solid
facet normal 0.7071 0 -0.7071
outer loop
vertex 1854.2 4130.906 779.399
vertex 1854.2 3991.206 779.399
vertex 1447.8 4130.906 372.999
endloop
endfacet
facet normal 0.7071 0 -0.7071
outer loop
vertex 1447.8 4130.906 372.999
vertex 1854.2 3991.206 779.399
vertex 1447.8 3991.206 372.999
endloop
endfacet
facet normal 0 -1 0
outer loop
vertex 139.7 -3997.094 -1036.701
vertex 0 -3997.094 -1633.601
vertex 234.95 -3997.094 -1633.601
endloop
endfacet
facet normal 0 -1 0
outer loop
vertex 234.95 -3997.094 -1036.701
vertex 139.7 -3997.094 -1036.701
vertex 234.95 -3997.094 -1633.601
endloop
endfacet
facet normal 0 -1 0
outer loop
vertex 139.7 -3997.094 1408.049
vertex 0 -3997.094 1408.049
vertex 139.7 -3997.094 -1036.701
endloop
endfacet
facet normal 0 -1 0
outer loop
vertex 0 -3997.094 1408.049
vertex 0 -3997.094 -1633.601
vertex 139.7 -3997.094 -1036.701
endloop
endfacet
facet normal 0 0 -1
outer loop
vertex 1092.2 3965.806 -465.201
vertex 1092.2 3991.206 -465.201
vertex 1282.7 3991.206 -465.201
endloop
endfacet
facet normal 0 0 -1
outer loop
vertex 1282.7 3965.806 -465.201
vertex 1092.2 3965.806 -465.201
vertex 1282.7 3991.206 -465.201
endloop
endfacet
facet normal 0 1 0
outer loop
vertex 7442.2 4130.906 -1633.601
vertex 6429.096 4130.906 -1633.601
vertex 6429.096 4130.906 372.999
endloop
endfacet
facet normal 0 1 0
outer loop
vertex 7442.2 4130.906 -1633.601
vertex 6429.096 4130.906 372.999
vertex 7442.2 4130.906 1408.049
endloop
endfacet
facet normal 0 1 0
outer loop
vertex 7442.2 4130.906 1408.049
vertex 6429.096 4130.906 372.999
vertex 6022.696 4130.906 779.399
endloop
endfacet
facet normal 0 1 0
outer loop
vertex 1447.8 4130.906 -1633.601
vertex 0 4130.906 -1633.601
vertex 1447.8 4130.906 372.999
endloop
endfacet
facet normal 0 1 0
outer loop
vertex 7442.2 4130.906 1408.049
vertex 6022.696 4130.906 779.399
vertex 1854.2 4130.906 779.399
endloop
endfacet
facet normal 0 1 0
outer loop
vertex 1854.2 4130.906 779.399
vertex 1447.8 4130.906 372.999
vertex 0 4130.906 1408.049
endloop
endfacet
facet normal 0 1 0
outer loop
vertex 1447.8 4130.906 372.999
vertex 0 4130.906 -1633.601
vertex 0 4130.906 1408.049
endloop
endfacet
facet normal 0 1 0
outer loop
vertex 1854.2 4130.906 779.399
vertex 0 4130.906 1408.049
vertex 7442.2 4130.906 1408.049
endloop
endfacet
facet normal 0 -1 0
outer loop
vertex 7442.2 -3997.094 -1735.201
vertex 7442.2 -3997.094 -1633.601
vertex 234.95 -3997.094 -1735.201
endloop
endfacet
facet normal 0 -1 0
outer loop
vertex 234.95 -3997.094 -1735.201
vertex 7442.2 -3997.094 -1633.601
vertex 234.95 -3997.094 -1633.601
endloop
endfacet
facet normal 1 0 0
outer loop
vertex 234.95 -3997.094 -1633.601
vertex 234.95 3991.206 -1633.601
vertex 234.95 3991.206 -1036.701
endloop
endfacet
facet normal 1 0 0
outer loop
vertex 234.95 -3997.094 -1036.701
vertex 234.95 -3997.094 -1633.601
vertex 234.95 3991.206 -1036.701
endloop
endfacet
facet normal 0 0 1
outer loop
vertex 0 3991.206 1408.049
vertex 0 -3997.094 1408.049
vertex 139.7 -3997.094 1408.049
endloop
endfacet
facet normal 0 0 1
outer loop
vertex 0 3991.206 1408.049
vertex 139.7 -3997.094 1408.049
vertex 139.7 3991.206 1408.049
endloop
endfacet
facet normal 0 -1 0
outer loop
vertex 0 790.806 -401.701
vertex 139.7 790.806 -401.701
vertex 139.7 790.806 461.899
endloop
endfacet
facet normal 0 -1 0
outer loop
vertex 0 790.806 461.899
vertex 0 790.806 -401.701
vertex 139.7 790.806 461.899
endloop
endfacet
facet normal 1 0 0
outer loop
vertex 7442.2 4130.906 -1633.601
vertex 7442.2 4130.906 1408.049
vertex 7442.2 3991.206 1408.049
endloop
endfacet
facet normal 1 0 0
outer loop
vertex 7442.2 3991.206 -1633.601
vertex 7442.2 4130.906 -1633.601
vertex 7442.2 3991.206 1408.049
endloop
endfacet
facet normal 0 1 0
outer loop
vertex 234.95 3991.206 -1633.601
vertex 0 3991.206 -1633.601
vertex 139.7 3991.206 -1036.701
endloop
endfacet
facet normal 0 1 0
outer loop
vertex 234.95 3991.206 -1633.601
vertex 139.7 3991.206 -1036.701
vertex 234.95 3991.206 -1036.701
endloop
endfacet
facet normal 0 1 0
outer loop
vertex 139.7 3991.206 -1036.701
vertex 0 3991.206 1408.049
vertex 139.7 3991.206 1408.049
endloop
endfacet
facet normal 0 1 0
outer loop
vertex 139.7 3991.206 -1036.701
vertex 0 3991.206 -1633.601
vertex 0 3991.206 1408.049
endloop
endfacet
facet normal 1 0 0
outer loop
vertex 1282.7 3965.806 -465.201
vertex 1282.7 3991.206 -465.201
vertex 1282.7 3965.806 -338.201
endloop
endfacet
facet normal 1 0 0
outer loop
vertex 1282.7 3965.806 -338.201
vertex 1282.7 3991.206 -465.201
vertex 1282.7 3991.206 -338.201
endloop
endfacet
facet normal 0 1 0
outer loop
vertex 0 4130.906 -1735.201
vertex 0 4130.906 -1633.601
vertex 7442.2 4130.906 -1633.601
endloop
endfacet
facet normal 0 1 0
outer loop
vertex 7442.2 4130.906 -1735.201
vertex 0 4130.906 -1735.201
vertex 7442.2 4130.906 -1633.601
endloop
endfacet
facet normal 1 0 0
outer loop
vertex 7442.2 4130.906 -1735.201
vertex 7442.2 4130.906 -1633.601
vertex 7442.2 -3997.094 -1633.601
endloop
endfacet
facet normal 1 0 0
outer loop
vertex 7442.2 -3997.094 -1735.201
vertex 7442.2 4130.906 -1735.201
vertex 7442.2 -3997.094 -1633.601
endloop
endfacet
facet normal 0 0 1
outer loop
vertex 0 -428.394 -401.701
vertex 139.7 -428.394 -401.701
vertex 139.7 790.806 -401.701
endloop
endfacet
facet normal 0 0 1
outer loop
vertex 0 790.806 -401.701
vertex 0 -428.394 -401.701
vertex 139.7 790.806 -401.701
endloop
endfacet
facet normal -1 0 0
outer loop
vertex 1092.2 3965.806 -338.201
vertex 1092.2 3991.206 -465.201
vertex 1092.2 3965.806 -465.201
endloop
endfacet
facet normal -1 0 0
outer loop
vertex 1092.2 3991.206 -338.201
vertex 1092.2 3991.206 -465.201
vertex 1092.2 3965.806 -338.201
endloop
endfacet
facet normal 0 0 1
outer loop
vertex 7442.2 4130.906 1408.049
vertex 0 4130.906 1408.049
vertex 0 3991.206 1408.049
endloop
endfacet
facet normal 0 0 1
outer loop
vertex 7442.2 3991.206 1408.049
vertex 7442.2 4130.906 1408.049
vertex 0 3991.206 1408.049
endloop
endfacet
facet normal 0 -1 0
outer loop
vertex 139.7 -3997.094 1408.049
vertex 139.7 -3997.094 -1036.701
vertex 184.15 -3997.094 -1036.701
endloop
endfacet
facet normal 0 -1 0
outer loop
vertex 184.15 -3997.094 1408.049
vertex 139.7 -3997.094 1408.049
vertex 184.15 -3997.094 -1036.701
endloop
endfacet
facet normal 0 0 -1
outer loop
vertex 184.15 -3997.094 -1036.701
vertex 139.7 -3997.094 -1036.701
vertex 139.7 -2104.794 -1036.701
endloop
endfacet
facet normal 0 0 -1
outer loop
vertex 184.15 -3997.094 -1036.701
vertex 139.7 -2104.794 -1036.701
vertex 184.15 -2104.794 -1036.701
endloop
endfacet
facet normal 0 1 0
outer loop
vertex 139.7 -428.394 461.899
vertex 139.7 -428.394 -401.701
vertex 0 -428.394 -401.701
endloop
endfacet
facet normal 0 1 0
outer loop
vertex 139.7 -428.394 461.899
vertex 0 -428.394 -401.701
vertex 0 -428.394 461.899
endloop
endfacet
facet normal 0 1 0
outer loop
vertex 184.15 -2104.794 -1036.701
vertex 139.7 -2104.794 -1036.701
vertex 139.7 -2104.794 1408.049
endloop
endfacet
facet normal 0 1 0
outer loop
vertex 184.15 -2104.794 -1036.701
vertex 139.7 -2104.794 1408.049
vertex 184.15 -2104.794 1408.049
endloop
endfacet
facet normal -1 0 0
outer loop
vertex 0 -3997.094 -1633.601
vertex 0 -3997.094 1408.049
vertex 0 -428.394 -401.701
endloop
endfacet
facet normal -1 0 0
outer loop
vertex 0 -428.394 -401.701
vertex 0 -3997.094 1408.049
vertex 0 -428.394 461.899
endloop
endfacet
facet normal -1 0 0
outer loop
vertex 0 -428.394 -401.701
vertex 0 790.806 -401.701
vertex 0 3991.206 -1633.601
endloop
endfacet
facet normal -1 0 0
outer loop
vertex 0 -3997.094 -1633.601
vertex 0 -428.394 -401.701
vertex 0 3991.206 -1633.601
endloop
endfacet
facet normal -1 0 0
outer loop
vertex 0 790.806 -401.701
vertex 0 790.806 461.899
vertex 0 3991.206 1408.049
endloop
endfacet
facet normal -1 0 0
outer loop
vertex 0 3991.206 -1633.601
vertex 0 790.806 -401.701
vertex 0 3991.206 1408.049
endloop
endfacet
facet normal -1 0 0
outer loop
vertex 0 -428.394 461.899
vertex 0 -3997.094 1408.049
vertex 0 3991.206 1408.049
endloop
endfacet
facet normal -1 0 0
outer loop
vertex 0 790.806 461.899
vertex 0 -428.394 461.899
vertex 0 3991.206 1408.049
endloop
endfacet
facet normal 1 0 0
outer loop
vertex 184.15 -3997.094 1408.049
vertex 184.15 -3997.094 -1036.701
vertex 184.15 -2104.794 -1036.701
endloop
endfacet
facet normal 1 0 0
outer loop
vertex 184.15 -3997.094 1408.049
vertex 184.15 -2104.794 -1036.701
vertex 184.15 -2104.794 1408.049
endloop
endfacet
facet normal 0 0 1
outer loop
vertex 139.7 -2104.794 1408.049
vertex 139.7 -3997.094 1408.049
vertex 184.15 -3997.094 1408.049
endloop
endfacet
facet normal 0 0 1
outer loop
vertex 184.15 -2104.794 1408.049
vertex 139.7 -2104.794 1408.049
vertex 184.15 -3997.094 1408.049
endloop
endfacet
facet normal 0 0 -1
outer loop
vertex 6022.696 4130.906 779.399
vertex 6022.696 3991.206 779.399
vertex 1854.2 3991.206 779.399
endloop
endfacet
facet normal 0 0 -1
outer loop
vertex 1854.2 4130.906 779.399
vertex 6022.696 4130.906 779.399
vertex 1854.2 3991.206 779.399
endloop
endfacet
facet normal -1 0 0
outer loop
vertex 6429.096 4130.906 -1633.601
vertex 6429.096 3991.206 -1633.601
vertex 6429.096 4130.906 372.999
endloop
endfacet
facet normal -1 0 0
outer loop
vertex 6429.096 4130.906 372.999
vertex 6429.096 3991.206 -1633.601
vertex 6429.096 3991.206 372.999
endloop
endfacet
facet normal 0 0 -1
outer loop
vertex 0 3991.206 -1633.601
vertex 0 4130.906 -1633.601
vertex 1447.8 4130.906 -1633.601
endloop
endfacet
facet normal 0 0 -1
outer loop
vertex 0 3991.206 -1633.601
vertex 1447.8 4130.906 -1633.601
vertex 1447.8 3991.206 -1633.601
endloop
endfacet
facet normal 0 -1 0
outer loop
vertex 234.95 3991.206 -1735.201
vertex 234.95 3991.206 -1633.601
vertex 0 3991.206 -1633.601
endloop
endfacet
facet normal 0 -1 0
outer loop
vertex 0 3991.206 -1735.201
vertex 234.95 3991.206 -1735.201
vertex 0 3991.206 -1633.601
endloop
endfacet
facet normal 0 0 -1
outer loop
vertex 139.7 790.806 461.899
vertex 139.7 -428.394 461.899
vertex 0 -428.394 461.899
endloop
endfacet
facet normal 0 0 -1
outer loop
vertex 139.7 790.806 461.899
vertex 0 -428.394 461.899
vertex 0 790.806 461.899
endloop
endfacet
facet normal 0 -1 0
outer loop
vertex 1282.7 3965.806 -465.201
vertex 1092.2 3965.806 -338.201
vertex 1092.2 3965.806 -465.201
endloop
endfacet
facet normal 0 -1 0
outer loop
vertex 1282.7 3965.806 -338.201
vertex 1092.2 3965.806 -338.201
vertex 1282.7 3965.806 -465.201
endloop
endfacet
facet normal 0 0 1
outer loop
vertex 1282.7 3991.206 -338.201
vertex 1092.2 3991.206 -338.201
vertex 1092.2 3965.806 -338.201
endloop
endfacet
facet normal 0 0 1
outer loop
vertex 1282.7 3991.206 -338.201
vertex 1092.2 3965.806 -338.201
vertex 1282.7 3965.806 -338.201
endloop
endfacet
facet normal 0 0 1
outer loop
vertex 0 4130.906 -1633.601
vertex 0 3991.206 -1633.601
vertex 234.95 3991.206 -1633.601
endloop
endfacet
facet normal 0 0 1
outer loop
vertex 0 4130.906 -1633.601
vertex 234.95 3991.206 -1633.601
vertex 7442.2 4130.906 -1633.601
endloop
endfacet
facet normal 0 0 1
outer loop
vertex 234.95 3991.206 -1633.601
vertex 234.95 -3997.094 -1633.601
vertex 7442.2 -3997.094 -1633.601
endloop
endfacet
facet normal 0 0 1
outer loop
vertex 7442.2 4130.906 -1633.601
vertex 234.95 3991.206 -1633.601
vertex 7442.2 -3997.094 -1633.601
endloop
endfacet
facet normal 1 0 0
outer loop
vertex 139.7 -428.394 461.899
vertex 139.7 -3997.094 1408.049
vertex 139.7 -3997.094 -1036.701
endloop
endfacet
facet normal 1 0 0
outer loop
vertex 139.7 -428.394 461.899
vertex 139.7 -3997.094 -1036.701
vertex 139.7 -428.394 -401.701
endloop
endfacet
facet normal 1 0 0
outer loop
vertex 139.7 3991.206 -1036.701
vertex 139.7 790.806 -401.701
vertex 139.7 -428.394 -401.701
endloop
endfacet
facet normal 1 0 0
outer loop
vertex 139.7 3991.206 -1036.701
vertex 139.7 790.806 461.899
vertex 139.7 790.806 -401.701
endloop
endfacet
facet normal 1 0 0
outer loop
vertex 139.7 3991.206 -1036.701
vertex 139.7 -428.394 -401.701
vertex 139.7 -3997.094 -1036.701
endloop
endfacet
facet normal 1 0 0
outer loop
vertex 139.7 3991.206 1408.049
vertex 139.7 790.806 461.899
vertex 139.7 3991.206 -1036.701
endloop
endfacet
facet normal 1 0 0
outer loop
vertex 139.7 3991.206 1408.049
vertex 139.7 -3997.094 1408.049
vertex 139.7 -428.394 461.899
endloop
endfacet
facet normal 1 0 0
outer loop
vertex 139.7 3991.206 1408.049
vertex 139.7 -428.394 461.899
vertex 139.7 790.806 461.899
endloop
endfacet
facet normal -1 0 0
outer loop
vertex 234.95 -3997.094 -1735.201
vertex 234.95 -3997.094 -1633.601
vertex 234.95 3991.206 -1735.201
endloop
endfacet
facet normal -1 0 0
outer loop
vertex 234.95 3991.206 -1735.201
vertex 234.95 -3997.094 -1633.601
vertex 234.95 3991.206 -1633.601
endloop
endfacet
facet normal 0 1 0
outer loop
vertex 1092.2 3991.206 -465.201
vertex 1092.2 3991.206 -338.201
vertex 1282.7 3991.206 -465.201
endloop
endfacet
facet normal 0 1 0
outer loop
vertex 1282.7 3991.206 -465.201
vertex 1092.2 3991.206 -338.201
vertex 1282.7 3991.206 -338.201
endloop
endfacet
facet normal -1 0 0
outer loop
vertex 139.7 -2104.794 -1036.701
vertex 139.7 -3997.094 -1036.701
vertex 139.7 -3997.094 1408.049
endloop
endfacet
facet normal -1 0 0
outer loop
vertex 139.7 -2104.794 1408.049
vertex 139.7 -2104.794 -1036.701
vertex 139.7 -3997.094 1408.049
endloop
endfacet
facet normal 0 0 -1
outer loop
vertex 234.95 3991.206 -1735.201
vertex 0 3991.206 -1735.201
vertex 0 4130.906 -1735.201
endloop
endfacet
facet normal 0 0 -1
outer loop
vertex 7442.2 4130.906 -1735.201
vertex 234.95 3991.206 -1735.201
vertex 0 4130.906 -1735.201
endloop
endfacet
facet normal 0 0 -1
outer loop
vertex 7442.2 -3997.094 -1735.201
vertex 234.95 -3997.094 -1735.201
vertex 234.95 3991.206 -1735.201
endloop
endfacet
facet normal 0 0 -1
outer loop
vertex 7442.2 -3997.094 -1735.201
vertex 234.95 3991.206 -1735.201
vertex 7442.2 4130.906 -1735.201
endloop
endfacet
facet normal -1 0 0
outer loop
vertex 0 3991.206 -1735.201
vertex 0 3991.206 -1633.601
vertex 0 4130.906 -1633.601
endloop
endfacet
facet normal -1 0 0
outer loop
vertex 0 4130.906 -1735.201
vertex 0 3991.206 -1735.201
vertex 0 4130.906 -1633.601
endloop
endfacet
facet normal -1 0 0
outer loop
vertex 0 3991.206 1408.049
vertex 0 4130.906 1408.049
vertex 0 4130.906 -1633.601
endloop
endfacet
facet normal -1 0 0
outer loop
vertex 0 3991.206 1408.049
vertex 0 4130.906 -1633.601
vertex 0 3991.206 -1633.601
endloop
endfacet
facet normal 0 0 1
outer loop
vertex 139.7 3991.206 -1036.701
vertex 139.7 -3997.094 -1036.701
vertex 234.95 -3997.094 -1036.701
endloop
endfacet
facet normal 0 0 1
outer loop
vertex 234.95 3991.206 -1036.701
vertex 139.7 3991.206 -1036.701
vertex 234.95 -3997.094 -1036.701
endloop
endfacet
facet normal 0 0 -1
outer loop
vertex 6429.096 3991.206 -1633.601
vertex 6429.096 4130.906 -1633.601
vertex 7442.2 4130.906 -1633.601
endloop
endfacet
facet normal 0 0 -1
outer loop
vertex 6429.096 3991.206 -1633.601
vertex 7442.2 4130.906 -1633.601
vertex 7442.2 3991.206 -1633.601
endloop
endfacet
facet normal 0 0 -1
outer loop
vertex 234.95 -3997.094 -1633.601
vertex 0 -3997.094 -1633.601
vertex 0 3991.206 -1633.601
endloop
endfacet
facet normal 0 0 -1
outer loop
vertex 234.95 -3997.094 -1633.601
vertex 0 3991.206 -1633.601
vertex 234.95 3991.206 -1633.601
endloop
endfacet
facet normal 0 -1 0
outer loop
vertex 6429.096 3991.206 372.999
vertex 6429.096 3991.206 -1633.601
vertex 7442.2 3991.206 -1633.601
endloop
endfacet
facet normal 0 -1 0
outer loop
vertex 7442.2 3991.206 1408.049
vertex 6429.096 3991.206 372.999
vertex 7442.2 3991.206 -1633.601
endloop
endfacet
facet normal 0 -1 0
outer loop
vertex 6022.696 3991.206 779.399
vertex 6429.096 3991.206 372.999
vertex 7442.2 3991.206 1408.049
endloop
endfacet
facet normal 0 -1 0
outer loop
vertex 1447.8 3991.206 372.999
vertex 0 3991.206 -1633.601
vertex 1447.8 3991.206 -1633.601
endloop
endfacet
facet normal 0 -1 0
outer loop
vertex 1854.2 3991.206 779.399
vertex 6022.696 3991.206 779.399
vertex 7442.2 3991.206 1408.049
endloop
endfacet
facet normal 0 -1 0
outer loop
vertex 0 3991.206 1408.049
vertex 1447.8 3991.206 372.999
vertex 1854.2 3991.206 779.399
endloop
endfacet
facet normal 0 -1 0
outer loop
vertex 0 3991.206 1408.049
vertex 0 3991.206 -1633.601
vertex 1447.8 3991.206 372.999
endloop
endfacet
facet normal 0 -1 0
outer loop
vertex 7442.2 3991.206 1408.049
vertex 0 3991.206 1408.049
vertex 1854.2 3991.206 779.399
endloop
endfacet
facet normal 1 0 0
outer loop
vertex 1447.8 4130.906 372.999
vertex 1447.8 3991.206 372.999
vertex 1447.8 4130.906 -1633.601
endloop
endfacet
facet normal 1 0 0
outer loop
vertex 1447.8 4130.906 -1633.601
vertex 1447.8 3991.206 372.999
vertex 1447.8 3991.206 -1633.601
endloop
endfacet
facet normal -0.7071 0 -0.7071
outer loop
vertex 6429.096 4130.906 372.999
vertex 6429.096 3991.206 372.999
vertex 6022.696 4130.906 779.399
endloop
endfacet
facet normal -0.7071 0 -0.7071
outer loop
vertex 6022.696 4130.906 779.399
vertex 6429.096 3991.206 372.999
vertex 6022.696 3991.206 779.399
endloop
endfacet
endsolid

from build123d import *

# Parameters (mm, degrees)
F0_W      = 7988.3
F0_H      = 3041.65
F1_DEPTH  = 139.7
F2_W      = 1219.2
F2_H      = 863.6
F3_DEPTH  = 139.7
F4_W      = 95.25
F4_H      = 596.9
F5_DEPTH  = 7988.3
F6_W      = 139.7
F6_H      = 3041.65
F7_DEPTH  = 7442.2
F9_DEPTH  = 139.7
F11_DEPTH = 101.6
F12_W     = 44.45
F12_H     = 2444.75
F13_DEPTH = 1892.3
F14_W     = 190.5
F14_H     = 127
F15_DEPTH = 25.4


with BuildPart() as f1:
    # F0 (on Right) → F1 (new body)
    with BuildSketch(Plane.YZ):
        with Locations((-2.944235, -112.775769)):
            Rectangle(F0_W, F0_H)
    extrude(amount=F1_DEPTH)

    # F2 (on face) → F3 (cut, through all)
    with BuildSketch(Plane.YZ.offset(139.7)):
        with Locations((181.205765, 30.099231)):
            Rectangle(F2_W, F2_H)
    extrude(amount=-F3_DEPTH, mode=Mode.SUBTRACT)

    # F4 (on face) → F5 (join, through all)
    with BuildSketch(Plane.XZ.offset(3997.094235)):
        with Locations((187.325, -1335.150769)):
            Rectangle(F4_W, F4_H)
    extrude(amount=-F5_DEPTH)


with BuildPart() as f7:
    # F6 (on face) → F7 (new body)
    with BuildSketch(Plane(origin=(0, 0, 0), x_dir=(0, -1, 0), z_dir=(-1, 0, 0))):
        with Locations((-4061.055765, -112.775769)):
            Rectangle(F6_W, F6_H)
    extrude(amount=-F7_DEPTH)

    # F8 (on face) → F9 (cut, through all)
    with BuildSketch(Plane.XZ.offset(-3991.205765)):
        Polygon((1447.8, 372.999231), (1447.8, -1633.600769), (6429.096018, -1633.600769), (6429.096018, 372.999231), (6022.696018, 779.399231), (1854.2, 779.399231), align=None)
    extrude(amount=-F9_DEPTH, mode=Mode.SUBTRACT)


with BuildPart() as f11:
    # F10 (on face) → F11 (new body)
    with BuildSketch(Plane(origin=(0, 0, -1633.600769), x_dir=(1, 0, 0), z_dir=(0, 0, -1))):
        Polygon((7442.2, 3997.094235), (234.95, 3997.094235), (234.95, -3991.205765), (0, -3991.205765), (0, -4130.905765), (7442.2, -4130.905765), align=None)
    extrude(amount=F11_DEPTH)


with BuildPart() as f13:
    # F12 (on face) → F13 (new body)
    with BuildSketch(Plane.XZ.offset(3997.094235)):
        with Locations((161.925, 185.674231)):
            Rectangle(F12_W, F12_H)
    extrude(amount=-F13_DEPTH)


with BuildPart() as f15:
    # F14 (on face) → F15 (new body)
    with BuildSketch(Plane.XZ.offset(-3991.205765)):
        with Locations((1187.45, -401.700769)):
            Rectangle(F14_W, F14_H)
    extrude(amount=F15_DEPTH)


solid = Compound([f1.part, f7.part, f11.part, f13.part, f15.part])
